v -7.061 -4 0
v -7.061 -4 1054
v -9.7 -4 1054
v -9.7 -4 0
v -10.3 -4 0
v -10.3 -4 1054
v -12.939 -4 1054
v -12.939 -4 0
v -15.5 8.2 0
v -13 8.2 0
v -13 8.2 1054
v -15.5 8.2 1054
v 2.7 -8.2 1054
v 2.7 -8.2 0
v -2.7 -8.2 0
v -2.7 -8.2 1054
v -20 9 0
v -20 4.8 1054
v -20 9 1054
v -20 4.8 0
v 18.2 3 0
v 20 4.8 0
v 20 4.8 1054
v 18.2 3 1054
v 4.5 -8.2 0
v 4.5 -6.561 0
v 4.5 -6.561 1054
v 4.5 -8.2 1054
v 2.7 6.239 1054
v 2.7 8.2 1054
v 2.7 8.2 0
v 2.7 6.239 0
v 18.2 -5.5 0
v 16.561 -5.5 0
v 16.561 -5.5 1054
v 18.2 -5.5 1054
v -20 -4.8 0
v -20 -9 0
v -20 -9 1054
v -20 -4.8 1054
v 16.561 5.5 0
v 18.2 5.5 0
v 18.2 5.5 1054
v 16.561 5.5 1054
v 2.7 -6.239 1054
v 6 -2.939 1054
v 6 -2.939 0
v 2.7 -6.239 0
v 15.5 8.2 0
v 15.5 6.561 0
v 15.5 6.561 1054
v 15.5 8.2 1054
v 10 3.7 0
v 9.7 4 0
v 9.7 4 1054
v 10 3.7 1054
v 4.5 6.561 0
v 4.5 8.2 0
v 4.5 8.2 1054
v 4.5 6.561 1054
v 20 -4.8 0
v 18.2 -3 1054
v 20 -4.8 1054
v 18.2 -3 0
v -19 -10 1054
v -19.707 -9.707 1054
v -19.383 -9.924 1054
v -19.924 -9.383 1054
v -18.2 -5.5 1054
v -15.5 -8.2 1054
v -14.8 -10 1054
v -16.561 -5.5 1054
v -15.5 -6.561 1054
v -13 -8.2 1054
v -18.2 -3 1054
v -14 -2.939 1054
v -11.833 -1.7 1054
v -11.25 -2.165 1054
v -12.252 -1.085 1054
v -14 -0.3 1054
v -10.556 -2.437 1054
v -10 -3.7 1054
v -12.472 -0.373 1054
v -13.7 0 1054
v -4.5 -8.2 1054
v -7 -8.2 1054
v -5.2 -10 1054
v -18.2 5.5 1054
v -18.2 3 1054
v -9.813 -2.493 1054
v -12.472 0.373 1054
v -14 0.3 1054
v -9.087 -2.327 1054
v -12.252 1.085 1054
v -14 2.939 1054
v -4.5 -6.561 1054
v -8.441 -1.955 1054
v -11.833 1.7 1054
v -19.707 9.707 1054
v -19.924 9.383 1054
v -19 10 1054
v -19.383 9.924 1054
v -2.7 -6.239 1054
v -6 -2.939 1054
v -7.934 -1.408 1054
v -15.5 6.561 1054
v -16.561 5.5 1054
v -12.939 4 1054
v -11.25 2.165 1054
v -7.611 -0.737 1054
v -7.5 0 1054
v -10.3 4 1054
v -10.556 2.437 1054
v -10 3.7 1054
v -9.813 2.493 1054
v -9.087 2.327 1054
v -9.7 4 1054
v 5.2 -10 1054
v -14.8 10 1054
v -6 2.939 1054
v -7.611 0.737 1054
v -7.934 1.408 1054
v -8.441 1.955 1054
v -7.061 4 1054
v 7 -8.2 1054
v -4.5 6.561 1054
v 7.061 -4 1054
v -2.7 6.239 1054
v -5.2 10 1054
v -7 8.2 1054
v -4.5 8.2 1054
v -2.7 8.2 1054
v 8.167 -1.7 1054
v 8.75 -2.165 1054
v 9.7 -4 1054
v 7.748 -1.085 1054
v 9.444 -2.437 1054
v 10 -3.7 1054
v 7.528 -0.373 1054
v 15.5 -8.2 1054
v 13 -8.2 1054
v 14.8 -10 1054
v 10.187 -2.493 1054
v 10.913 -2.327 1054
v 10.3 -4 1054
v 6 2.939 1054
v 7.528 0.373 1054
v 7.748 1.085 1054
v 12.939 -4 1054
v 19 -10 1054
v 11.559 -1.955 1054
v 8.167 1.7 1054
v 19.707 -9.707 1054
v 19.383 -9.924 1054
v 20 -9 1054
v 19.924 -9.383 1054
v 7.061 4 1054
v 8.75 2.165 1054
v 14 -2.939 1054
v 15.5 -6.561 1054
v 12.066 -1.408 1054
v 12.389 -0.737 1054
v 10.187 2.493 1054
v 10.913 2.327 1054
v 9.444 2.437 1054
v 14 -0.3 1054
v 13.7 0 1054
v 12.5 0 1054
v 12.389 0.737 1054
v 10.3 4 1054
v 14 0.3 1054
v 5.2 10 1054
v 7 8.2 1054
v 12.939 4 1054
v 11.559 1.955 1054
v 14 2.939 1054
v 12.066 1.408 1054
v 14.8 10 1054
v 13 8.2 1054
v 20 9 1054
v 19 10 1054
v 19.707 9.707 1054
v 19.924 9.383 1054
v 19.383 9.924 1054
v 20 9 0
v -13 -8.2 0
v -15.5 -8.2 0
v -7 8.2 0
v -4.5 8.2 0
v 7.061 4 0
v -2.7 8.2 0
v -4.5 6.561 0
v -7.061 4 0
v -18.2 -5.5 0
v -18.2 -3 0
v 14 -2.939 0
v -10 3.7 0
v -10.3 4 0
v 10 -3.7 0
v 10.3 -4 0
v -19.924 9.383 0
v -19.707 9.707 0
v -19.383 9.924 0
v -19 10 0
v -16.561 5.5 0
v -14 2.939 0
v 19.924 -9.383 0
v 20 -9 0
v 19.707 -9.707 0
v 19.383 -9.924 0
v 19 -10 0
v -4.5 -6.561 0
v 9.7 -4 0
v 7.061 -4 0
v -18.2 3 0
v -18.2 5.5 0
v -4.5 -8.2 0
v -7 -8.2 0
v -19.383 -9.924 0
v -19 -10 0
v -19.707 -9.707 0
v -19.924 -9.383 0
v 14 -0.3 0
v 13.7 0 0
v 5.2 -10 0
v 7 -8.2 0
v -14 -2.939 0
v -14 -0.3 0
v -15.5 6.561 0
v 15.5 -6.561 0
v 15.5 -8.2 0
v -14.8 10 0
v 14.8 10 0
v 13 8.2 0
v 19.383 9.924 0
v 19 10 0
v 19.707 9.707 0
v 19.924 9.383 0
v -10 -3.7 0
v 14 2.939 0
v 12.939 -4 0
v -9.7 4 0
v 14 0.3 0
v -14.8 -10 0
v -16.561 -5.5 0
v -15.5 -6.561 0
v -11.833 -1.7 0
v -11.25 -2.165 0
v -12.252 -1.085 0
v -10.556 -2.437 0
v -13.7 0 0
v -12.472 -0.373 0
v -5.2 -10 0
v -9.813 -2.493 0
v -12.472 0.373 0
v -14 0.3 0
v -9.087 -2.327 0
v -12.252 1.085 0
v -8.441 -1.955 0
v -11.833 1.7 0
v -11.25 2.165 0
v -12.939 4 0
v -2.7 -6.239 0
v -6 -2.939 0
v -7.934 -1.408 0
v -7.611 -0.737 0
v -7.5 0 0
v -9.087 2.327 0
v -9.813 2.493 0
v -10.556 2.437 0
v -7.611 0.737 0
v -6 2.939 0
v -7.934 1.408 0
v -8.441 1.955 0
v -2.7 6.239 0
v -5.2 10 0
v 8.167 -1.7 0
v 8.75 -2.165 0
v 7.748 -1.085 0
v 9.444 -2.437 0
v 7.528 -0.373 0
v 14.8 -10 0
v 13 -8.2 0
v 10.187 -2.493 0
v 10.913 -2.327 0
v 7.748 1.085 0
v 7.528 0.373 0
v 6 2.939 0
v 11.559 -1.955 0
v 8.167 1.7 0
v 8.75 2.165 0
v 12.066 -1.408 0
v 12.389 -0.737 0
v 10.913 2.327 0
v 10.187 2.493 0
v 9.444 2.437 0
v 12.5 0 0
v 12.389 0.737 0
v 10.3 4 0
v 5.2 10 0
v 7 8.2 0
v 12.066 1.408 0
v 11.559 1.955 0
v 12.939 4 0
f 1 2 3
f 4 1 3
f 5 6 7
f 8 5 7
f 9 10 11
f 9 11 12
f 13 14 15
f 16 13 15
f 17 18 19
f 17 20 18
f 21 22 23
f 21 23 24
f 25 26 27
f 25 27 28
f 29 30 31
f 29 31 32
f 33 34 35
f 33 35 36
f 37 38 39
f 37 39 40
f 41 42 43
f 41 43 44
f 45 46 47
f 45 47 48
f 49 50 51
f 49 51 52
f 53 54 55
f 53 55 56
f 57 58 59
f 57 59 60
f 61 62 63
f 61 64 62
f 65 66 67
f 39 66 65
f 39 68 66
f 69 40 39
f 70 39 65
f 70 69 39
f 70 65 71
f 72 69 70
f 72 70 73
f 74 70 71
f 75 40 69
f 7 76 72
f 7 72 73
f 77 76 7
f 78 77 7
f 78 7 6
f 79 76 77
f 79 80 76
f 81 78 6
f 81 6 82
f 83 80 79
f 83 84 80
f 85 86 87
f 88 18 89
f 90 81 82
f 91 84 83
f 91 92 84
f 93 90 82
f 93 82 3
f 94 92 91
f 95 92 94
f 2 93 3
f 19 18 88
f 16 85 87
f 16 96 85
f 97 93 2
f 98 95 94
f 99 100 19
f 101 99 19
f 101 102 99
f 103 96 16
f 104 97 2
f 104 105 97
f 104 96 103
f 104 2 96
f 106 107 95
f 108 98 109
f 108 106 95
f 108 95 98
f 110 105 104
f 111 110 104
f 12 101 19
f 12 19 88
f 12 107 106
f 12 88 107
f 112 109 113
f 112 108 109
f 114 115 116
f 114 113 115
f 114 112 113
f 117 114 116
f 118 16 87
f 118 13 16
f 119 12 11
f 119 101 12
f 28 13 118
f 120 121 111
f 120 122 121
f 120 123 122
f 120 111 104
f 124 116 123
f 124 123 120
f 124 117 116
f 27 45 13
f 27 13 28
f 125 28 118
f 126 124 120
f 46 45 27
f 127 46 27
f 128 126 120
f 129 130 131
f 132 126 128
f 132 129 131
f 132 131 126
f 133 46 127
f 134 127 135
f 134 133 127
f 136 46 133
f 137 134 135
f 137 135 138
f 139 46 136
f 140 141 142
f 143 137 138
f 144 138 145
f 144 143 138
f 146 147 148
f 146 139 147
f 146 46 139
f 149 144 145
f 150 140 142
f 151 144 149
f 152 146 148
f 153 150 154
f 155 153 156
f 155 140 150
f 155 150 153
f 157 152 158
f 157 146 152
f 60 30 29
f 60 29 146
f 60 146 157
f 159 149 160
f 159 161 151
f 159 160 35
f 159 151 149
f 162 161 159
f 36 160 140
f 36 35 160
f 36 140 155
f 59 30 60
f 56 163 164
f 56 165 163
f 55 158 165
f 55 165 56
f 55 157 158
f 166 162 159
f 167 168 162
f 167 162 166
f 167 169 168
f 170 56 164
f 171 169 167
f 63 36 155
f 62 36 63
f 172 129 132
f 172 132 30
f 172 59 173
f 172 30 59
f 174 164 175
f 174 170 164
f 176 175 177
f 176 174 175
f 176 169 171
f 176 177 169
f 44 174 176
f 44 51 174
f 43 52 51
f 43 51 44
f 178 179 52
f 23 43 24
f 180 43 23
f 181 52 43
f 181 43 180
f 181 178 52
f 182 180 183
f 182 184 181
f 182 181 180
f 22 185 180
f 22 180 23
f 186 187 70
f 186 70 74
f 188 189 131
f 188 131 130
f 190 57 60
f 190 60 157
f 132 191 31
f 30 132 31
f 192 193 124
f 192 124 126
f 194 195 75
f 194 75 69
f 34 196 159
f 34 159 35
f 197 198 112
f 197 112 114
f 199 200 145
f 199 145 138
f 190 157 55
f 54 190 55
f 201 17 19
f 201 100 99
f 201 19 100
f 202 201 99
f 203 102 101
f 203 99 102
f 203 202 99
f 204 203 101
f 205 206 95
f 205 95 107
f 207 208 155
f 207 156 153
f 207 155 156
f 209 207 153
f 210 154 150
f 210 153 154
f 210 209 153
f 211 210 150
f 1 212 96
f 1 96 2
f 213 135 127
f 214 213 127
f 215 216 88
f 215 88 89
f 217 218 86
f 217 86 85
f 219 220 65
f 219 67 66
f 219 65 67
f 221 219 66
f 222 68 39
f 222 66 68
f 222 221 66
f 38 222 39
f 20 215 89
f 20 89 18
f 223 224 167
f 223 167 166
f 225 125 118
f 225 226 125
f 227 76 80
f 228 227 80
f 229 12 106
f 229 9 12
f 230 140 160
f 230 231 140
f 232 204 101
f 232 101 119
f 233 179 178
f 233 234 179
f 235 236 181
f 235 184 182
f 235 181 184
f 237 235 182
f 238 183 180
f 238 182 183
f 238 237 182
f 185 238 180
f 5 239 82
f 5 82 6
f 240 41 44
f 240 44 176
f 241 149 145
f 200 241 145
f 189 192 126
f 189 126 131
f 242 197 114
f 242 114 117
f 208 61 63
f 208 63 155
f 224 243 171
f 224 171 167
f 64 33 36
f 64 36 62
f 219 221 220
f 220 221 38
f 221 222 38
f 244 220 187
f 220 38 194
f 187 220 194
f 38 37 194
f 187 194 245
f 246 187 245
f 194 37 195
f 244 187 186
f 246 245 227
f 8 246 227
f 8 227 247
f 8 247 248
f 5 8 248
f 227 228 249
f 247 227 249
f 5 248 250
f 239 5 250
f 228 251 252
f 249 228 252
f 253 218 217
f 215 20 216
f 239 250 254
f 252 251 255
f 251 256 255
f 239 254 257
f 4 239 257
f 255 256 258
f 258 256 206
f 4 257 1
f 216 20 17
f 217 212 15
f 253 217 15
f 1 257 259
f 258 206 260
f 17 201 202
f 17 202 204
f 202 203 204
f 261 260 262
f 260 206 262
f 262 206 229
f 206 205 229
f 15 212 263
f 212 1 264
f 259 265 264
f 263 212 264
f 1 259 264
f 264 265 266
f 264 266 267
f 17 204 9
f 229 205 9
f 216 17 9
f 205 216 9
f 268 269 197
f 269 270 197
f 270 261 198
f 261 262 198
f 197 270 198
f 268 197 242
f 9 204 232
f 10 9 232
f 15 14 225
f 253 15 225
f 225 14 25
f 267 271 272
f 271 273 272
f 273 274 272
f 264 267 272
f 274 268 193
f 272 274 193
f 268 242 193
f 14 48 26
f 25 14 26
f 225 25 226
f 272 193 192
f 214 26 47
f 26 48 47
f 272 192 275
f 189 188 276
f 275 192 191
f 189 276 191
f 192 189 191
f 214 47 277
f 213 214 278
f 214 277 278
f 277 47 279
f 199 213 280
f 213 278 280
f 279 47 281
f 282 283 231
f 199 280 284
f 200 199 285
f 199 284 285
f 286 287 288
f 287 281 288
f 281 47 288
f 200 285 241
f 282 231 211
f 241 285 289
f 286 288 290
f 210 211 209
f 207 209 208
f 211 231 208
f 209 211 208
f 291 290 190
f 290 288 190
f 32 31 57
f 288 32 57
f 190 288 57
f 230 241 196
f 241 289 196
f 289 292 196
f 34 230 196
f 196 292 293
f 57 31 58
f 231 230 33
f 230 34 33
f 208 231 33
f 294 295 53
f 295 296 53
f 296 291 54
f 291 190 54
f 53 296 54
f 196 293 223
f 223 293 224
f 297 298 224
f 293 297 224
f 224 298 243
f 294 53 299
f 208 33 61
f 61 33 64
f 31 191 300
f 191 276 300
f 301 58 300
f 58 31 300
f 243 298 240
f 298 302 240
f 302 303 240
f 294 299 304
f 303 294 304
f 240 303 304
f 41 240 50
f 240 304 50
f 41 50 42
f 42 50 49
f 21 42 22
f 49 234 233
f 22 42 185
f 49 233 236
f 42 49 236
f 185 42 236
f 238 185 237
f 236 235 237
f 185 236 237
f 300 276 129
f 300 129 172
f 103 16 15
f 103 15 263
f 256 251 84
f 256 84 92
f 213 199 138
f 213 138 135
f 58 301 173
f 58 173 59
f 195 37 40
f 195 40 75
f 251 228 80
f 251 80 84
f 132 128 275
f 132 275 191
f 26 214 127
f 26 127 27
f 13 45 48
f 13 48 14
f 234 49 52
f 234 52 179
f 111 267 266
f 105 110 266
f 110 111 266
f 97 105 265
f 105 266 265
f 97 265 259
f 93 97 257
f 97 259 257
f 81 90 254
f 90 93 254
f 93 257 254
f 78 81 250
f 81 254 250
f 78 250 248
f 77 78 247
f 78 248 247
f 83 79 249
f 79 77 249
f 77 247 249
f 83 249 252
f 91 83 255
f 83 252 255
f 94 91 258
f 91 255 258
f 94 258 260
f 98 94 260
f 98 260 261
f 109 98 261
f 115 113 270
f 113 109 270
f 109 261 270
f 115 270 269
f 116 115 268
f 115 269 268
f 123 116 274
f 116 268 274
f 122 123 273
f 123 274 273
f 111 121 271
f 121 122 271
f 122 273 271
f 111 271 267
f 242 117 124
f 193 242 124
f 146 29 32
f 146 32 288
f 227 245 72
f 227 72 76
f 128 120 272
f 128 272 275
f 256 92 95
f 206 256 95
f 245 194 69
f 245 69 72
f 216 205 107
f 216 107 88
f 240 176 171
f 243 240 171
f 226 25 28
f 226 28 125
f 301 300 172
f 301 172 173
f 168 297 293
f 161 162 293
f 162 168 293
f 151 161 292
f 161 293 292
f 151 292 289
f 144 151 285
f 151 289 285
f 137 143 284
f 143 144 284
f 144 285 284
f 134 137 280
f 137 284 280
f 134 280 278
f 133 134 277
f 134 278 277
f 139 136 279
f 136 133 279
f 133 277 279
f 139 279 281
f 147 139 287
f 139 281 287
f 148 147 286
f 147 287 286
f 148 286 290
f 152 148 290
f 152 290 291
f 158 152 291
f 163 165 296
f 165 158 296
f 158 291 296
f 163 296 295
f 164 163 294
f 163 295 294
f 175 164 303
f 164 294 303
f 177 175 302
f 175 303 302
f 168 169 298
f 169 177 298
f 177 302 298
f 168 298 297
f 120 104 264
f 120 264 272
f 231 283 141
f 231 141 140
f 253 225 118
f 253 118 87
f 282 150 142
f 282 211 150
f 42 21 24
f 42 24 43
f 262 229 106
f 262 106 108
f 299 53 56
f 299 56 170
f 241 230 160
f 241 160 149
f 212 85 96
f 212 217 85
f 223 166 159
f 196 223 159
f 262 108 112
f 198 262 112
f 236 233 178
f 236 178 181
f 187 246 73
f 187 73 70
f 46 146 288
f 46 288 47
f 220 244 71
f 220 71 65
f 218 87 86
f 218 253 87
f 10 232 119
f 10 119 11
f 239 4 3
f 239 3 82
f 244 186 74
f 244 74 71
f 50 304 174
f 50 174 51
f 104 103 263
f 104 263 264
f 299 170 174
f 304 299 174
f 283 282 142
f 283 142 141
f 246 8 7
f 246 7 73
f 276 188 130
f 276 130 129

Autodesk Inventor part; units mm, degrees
ref_plane "YZ Plane" through (0, 0, 0) normal (1, 0, 0) x (0, 1, 0)
ref_plane "XZ Plane" through (0, 0, 0) normal (0, 1, 0) x (-1, 0, 0)
ref_plane "XY Plane" through (0, 0, 0) normal (0, 0, 1) x (1, 0, 0)
sketch "Esboço1" plane through (0, 0, 0) normal (0, 0, 1) x (1, 0, 0)
  arc A0 (19, -10) -> (20, -9) centre (19, -9) ccw
  line L0 (20, -4.8) -> (20, -9)
  line L1 (18.2, -3) -> (20, -4.8)
  line L2 (18.2, -5.5) -> (18.2, -3)
  line L3 (16.5607, -5.5) -> (18.2, -5.5)
  line L4 (14, -2.9393) -> (16.5607, -5.5)
  line L5 (14, -0.3) -> (14, -2.9393)
  line L6 (13.7, 0) -> (14, -0.3)
  line L7 (14, 0.3) -> (13.7, 0)
  line L8 (14, 2.9393) -> (14, 0.3)
  line L9 (16.5607, 5.5) -> (14, 2.9393)
  line L10 (18.2, 5.5) -> (16.5607, 5.5)
  line L11 (18.2, 3) -> (18.2, 5.5)
  line L12 (20, 4.8) -> (18.2, 3)
  line L13 (20, 9) -> (20, 4.8)
  arc A1 (20, 9) -> (19, 10) centre (19, 9) ccw
  line L14 (14.8, 10) -> (19, 10)
  line L15 (13, 8.2) -> (14.8, 10)
  line L16 (15.5, 8.2) -> (13, 8.2)
  line L17 (15.5, 6.5607) -> (15.5, 8.2)
  line L18 (12.9393, 4) -> (15.5, 6.5607)
  line L19 (10.3, 4) -> (12.9393, 4)
  line L20 (10, 3.7) -> (10.3, 4)
  line L21 (9.7, 4) -> (10, 3.7)
  line L22 (7.0607, 4) -> (9.7, 4)
  line L23 (4.5, 6.5607) -> (7.0607, 4)
  line L24 (4.5, 8.2) -> (4.5, 6.5607)
  line L25 (7, 8.2) -> (4.5, 8.2)
  line L26 (5.2, 10) -> (7, 8.2)
  line L27 (-5.2, 10) -> (5.2, 10)
  line L28 (-7, 8.2) -> (-5.2, 10)
  line L29 (-4.5, 8.2) -> (-7, 8.2)
  line L30 (-4.5, 6.5607) -> (-4.5, 8.2)
  line L31 (-7.0607, 4) -> (-4.5, 6.5607)
  line L32 (-9.7, 4) -> (-7.0607, 4)
  line L33 (-10, 3.7) -> (-9.7, 4)
  line L34 (-10.3, 4) -> (-10, 3.7)
  line L35 (-12.9393, 4) -> (-10.3, 4)
  line L36 (-15.5, 6.5607) -> (-12.9393, 4)
  line L37 (-15.5, 8.2) -> (-15.5, 6.5607)
  line L38 (-13, 8.2) -> (-15.5, 8.2)
  line L39 (-14.8, 10) -> (-13, 8.2)
  line L40 (-19, 10) -> (-14.8, 10)
  arc A2 (-19, 10) -> (-20, 9) centre (-19, 9) ccw
  line L41 (-20, 4.8) -> (-20, 9)
  line L42 (-18.2, 3) -> (-20, 4.8)
  line L43 (-18.2, 5.5) -> (-18.2, 3)
  line L44 (-16.5607, 5.5) -> (-18.2, 5.5)
  line L45 (-14, 2.9393) -> (-16.5607, 5.5)
  line L46 (-14, 0.3) -> (-14, 2.9393)
  line L47 (-13.7, 0) -> (-14, 0.3)
  line L48 (-14, -0.3) -> (-13.7, 0)
  line L49 (-14, -2.9393) -> (-14, -0.3)
  line L50 (-16.5607, -5.5) -> (-14, -2.9393)
  line L51 (-18.2, -5.5) -> (-16.5607, -5.5)
  line L52 (-18.2, -3) -> (-18.2, -5.5)
  line L53 (-20, -4.8) -> (-18.2, -3)
  line L54 (-20, -9) -> (-20, -4.8)
  arc A3 (-20, -9) -> (-19, -10) centre (-19, -9) ccw
  line L55 (-14.8, -10) -> (-19, -10)
  line L56 (-13, -8.2) -> (-14.8, -10)
  line L57 (-15.5, -8.2) -> (-13, -8.2)
  line L58 (-15.5, -6.5607) -> (-15.5, -8.2)
  line L59 (-12.9393, -4) -> (-15.5, -6.5607)
  line L60 (-10.3, -4) -> (-12.9393, -4)
  line L61 (-10, -3.7) -> (-10.3, -4)
  line L62 (-9.7, -4) -> (-10, -3.7)
  line L63 (-7.0607, -4) -> (-9.7, -4)
  line L64 (-4.5, -6.5607) -> (-7.0607, -4)
  line L65 (-4.5, -8.2) -> (-4.5, -6.5607)
  line L66 (-7, -8.2) -> (-4.5, -8.2)
  line L67 (-5.2, -10) -> (-7, -8.2)
  line L68 (5.2, -10) -> (-5.2, -10)
  line L69 (7, -8.2) -> (5.2, -10)
  line L70 (4.5, -8.2) -> (7, -8.2)
  line L71 (4.5, -6.5607) -> (4.5, -8.2)
  line L72 (7.0607, -4) -> (4.5, -6.5607)
  line L73 (9.7, -4) -> (7.0607, -4)
  line L74 (10, -3.7) -> (9.7, -4)
  line L75 (10.3, -4) -> (10, -3.7)
  line L76 (12.9393, -4) -> (10.3, -4)
  line L77 (15.5, -6.5607) -> (12.9393, -4)
  line L78 (15.5, -8.2) -> (15.5, -6.5607)
  line L79 (13, -8.2) -> (15.5, -8.2)
  line L80 (14.8, -10) -> (13, -8.2)
  line L81 (19, -10) -> (14.8, -10)
  line L82 (-2.7, 8.2) -> (2.7, 8.2)
  line L83 (2.7, 8.2) -> (2.7, 6.2393)
  line L84 (2.7, 6.2393) -> (6, 2.9393)
  line L85 (6, 2.9393) -> (6, -2.9393)
  line L86 (6, -2.9393) -> (2.7, -6.2393)
  line L87 (2.7, -6.2393) -> (2.7, -8.2)
  line L88 (2.7, -8.2) -> (-2.7, -8.2)
  line L89 (-2.7, -8.2) -> (-2.7, -6.2393)
  line L90 (-2.7, -6.2393) -> (-6, -2.9393)
  line L91 (-6, -2.9393) -> (-6, 2.9393)
  line L92 (-6, 2.9393) -> (-2.7, 6.2393)
  line L93 (-2.7, 6.2393) -> (-2.7, 8.2)
  circle A4 centre (10, 0) radius 2.5
  circle A5 centre (-10, 0) radius 2.5
  point P0 (0, 0)
  point P1 (0, 0)
extrude "Extrusão1" add sketch "Esboço1" along normal blind 1054
properties part number "PERFIL_ESTRUTURAL_20X40_MESA"
